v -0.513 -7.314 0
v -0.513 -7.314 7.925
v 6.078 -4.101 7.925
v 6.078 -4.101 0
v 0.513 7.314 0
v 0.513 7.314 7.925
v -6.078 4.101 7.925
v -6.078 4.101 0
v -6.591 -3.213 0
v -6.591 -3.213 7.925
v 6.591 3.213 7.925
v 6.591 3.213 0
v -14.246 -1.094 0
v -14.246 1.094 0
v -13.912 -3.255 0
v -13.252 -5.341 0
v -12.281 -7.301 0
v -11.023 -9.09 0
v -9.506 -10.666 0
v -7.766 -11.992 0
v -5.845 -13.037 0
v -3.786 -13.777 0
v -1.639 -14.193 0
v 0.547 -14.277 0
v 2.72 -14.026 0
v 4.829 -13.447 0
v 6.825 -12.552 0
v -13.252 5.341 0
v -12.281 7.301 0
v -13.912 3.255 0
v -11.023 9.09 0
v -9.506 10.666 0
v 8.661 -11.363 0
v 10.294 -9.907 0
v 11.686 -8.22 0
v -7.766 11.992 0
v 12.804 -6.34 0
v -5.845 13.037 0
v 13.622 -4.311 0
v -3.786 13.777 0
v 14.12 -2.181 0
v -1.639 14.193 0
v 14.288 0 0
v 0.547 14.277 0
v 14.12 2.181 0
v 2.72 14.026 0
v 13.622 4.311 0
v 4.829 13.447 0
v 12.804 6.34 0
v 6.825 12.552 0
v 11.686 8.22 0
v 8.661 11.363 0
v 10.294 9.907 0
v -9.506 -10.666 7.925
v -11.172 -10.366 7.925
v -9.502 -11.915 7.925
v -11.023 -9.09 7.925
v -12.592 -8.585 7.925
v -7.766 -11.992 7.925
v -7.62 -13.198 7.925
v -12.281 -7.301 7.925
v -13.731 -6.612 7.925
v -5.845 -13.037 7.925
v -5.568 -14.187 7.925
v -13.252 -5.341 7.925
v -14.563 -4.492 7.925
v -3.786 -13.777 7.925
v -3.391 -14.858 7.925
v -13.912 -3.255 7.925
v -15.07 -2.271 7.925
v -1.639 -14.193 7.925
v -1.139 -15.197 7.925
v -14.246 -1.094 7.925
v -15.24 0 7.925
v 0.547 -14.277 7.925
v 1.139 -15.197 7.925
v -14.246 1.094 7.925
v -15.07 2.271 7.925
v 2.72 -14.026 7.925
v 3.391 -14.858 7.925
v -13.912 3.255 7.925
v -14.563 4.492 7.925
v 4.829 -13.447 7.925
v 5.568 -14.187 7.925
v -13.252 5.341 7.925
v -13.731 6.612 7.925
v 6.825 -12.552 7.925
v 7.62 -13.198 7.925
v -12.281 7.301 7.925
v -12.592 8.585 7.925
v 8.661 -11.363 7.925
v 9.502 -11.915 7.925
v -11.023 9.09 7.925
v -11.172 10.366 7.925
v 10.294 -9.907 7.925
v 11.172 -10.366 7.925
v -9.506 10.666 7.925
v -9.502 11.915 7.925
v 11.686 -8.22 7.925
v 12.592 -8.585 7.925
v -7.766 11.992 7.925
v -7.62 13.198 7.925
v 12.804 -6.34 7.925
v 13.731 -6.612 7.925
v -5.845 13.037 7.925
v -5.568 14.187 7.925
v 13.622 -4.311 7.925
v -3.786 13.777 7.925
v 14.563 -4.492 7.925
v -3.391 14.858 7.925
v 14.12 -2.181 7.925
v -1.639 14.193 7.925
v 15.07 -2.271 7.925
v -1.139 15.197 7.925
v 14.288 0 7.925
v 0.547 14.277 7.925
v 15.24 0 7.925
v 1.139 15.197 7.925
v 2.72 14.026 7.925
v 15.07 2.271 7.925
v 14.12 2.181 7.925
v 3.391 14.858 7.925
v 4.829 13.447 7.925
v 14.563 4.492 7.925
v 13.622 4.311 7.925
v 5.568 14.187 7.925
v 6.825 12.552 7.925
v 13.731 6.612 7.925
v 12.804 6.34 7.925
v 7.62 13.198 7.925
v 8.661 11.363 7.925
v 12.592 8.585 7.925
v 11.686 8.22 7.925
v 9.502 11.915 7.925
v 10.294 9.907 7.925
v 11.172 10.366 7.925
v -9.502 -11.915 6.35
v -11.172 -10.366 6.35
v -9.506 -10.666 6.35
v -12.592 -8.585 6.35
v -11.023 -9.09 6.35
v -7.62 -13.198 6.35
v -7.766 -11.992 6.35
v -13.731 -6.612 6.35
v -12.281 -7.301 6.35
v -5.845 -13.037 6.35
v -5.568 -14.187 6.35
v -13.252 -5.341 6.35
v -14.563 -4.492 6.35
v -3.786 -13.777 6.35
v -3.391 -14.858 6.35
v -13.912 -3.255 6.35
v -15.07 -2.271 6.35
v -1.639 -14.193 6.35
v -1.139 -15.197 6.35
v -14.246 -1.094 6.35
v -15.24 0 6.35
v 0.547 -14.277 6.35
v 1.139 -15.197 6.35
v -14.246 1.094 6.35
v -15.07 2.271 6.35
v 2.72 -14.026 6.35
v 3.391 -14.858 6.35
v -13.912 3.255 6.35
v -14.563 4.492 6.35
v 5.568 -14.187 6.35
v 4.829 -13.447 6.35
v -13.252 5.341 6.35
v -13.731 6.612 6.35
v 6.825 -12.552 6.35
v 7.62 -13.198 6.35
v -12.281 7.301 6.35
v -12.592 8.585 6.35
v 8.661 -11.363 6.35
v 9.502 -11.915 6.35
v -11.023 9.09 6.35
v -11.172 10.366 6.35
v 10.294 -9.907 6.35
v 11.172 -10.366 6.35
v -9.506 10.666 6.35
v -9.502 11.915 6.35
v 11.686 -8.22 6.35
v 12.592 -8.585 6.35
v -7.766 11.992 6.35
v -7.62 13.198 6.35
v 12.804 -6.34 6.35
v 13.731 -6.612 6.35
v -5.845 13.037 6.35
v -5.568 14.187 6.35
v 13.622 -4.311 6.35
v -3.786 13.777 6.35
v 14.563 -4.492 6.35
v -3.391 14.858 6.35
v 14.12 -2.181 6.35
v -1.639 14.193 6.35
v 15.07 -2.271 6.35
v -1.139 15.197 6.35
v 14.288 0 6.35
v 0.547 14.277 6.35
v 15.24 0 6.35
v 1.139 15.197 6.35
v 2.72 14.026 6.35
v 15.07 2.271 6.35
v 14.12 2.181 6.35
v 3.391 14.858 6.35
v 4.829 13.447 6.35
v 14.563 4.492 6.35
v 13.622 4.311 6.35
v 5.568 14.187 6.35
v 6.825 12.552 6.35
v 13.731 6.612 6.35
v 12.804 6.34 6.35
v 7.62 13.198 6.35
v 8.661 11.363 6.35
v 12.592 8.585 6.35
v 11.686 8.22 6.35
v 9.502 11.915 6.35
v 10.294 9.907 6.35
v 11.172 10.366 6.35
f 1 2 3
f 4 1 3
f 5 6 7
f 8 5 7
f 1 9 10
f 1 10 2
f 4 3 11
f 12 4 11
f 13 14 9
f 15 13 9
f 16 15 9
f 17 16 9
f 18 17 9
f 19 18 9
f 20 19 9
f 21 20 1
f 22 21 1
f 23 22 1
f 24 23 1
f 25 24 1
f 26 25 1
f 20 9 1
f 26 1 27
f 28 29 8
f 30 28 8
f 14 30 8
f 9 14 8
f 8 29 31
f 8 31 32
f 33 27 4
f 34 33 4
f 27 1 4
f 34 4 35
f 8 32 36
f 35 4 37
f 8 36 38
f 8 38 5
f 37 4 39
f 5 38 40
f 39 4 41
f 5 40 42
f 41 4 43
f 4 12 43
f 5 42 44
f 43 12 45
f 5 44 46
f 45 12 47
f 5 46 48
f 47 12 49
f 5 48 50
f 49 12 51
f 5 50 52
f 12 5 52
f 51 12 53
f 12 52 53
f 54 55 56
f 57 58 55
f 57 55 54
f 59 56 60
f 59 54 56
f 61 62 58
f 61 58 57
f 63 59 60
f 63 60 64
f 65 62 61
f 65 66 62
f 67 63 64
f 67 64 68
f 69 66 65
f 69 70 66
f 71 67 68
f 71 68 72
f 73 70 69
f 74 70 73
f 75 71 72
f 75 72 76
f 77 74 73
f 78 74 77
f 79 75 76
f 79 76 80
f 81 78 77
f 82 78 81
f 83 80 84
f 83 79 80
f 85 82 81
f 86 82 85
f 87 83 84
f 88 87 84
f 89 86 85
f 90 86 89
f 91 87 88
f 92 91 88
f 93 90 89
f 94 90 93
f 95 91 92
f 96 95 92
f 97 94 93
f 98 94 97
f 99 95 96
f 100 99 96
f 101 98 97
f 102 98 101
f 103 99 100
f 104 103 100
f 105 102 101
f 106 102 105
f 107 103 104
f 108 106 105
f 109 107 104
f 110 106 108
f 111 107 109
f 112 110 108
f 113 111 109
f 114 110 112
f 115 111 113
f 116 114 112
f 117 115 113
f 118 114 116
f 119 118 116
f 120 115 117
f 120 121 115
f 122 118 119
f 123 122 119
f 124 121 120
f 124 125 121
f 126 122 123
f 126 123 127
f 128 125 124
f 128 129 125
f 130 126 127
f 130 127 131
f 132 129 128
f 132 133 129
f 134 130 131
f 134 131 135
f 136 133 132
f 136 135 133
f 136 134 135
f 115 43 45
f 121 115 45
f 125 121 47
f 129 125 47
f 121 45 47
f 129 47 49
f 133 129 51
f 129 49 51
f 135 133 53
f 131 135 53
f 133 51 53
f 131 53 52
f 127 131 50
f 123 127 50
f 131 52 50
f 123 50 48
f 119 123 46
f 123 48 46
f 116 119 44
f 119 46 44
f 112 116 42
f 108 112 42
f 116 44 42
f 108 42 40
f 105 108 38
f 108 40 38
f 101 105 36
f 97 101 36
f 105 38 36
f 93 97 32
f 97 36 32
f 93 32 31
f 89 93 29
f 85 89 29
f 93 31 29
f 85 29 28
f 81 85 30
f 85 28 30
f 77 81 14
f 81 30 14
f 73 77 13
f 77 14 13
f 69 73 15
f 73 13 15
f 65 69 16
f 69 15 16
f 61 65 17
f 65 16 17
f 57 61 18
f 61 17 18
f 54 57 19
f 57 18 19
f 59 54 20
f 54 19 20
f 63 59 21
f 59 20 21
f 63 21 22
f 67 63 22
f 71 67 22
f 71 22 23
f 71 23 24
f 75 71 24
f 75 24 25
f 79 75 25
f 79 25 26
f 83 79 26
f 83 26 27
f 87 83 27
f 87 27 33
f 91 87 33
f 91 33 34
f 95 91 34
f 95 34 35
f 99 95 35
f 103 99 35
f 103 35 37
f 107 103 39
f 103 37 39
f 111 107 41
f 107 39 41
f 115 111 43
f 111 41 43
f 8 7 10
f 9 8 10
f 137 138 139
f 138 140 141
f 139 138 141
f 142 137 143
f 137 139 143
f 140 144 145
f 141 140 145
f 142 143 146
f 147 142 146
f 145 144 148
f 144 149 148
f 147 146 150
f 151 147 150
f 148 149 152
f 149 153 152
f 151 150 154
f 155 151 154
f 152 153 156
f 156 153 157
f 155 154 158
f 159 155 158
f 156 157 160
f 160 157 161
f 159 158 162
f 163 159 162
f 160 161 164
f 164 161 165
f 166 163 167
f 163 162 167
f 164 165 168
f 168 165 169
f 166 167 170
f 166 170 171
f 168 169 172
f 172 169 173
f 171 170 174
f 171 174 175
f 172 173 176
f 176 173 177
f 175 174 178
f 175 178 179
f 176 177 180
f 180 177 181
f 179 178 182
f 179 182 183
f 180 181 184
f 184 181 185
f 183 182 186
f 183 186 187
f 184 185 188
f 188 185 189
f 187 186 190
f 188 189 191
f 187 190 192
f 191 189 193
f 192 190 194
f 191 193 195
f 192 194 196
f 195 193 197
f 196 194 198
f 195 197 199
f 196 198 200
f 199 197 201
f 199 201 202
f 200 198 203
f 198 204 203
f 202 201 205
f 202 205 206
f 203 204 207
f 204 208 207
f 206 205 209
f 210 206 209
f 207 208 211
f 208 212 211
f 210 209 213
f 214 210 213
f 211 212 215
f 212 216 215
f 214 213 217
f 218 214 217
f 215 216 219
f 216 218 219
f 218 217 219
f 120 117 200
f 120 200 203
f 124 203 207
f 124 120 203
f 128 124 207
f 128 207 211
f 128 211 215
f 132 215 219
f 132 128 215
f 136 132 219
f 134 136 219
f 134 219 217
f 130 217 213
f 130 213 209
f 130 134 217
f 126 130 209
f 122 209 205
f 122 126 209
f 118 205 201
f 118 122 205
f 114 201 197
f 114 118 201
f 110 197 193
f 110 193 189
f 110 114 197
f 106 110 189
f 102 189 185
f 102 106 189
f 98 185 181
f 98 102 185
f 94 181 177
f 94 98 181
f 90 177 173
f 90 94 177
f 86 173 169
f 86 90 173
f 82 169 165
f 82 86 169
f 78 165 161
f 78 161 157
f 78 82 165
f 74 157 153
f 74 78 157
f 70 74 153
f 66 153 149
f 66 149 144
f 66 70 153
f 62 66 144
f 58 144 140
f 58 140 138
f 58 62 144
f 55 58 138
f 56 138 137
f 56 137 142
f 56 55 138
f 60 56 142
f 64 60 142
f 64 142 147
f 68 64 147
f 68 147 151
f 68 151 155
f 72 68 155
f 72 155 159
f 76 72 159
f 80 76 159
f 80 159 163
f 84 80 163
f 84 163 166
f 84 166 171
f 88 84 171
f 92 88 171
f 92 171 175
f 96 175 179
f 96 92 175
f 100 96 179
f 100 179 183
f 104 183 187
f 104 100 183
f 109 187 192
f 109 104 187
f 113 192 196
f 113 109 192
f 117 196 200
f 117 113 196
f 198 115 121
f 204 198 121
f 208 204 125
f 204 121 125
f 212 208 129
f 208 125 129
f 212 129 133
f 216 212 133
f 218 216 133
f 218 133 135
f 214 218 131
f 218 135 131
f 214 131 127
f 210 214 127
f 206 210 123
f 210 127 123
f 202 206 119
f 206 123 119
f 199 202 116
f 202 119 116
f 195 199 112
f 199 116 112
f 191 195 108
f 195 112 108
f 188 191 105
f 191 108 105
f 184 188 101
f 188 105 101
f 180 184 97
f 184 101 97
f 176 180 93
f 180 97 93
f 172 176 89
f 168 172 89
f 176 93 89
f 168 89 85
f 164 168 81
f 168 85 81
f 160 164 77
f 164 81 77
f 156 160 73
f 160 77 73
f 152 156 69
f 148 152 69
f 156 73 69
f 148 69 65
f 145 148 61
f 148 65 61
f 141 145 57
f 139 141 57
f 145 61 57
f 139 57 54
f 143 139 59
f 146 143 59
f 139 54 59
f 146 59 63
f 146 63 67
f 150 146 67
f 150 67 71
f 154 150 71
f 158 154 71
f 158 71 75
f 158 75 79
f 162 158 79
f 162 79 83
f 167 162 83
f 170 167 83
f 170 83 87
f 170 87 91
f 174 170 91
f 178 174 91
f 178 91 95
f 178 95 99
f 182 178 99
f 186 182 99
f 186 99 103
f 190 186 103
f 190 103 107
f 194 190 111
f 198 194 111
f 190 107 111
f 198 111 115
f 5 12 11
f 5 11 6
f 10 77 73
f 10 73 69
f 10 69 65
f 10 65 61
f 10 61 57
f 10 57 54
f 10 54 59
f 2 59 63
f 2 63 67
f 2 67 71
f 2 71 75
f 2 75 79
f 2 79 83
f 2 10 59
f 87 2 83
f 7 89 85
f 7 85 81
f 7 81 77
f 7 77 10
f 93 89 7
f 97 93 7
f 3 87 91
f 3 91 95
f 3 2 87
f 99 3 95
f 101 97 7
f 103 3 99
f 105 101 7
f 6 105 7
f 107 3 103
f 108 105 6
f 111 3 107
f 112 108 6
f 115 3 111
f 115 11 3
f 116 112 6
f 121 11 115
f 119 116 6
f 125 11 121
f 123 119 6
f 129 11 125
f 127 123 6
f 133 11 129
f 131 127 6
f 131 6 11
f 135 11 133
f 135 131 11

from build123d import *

# Parameters (mm, degrees)
SKETCH1_R           = 14.2875
BOSS_EXTRUDE1_DEPTH = 7.9248
CUT_EXTRUDE1_DEPTH  = 7.9248
SKETCH3_R           = 15.24
SKETCH3_R_2         = 14.2875
BOSS_EXTRUDE2_DEPTH = 1.5748


with BuildPart() as part:
    # Sketch1 → Boss-Extrude1 (new body)
    with BuildSketch(Plane.XY):
        Circle(SKETCH1_R)
    extrude(amount=BOSS_EXTRUDE1_DEPTH)

    # Sketch2 → Cut-Extrude1 (cut)
    with BuildSketch(Plane.XY.offset(7.9248)):
        Polygon((6.5908862, 3.213028545), (0.512878757, 7.314389155), (-6.078007443, 4.101360611), (-6.5908862, -3.213028545), (-0.512878757, -7.314389155), (6.078007443, -4.101360611), align=None)
    extrude(amount=-CUT_EXTRUDE1_DEPTH, mode=Mode.SUBTRACT)


with BuildPart() as body_2:
    # Sketch3 → Boss-Extrude2 (new body)
    with BuildSketch(Plane.XY.offset(7.9248)):
        Circle(SKETCH3_R)
        Circle(SKETCH3_R_2, mode=Mode.SUBTRACT)
    extrude(amount=-BOSS_EXTRUDE2_DEPTH)


solid = Compound([part.part, body_2.part])
